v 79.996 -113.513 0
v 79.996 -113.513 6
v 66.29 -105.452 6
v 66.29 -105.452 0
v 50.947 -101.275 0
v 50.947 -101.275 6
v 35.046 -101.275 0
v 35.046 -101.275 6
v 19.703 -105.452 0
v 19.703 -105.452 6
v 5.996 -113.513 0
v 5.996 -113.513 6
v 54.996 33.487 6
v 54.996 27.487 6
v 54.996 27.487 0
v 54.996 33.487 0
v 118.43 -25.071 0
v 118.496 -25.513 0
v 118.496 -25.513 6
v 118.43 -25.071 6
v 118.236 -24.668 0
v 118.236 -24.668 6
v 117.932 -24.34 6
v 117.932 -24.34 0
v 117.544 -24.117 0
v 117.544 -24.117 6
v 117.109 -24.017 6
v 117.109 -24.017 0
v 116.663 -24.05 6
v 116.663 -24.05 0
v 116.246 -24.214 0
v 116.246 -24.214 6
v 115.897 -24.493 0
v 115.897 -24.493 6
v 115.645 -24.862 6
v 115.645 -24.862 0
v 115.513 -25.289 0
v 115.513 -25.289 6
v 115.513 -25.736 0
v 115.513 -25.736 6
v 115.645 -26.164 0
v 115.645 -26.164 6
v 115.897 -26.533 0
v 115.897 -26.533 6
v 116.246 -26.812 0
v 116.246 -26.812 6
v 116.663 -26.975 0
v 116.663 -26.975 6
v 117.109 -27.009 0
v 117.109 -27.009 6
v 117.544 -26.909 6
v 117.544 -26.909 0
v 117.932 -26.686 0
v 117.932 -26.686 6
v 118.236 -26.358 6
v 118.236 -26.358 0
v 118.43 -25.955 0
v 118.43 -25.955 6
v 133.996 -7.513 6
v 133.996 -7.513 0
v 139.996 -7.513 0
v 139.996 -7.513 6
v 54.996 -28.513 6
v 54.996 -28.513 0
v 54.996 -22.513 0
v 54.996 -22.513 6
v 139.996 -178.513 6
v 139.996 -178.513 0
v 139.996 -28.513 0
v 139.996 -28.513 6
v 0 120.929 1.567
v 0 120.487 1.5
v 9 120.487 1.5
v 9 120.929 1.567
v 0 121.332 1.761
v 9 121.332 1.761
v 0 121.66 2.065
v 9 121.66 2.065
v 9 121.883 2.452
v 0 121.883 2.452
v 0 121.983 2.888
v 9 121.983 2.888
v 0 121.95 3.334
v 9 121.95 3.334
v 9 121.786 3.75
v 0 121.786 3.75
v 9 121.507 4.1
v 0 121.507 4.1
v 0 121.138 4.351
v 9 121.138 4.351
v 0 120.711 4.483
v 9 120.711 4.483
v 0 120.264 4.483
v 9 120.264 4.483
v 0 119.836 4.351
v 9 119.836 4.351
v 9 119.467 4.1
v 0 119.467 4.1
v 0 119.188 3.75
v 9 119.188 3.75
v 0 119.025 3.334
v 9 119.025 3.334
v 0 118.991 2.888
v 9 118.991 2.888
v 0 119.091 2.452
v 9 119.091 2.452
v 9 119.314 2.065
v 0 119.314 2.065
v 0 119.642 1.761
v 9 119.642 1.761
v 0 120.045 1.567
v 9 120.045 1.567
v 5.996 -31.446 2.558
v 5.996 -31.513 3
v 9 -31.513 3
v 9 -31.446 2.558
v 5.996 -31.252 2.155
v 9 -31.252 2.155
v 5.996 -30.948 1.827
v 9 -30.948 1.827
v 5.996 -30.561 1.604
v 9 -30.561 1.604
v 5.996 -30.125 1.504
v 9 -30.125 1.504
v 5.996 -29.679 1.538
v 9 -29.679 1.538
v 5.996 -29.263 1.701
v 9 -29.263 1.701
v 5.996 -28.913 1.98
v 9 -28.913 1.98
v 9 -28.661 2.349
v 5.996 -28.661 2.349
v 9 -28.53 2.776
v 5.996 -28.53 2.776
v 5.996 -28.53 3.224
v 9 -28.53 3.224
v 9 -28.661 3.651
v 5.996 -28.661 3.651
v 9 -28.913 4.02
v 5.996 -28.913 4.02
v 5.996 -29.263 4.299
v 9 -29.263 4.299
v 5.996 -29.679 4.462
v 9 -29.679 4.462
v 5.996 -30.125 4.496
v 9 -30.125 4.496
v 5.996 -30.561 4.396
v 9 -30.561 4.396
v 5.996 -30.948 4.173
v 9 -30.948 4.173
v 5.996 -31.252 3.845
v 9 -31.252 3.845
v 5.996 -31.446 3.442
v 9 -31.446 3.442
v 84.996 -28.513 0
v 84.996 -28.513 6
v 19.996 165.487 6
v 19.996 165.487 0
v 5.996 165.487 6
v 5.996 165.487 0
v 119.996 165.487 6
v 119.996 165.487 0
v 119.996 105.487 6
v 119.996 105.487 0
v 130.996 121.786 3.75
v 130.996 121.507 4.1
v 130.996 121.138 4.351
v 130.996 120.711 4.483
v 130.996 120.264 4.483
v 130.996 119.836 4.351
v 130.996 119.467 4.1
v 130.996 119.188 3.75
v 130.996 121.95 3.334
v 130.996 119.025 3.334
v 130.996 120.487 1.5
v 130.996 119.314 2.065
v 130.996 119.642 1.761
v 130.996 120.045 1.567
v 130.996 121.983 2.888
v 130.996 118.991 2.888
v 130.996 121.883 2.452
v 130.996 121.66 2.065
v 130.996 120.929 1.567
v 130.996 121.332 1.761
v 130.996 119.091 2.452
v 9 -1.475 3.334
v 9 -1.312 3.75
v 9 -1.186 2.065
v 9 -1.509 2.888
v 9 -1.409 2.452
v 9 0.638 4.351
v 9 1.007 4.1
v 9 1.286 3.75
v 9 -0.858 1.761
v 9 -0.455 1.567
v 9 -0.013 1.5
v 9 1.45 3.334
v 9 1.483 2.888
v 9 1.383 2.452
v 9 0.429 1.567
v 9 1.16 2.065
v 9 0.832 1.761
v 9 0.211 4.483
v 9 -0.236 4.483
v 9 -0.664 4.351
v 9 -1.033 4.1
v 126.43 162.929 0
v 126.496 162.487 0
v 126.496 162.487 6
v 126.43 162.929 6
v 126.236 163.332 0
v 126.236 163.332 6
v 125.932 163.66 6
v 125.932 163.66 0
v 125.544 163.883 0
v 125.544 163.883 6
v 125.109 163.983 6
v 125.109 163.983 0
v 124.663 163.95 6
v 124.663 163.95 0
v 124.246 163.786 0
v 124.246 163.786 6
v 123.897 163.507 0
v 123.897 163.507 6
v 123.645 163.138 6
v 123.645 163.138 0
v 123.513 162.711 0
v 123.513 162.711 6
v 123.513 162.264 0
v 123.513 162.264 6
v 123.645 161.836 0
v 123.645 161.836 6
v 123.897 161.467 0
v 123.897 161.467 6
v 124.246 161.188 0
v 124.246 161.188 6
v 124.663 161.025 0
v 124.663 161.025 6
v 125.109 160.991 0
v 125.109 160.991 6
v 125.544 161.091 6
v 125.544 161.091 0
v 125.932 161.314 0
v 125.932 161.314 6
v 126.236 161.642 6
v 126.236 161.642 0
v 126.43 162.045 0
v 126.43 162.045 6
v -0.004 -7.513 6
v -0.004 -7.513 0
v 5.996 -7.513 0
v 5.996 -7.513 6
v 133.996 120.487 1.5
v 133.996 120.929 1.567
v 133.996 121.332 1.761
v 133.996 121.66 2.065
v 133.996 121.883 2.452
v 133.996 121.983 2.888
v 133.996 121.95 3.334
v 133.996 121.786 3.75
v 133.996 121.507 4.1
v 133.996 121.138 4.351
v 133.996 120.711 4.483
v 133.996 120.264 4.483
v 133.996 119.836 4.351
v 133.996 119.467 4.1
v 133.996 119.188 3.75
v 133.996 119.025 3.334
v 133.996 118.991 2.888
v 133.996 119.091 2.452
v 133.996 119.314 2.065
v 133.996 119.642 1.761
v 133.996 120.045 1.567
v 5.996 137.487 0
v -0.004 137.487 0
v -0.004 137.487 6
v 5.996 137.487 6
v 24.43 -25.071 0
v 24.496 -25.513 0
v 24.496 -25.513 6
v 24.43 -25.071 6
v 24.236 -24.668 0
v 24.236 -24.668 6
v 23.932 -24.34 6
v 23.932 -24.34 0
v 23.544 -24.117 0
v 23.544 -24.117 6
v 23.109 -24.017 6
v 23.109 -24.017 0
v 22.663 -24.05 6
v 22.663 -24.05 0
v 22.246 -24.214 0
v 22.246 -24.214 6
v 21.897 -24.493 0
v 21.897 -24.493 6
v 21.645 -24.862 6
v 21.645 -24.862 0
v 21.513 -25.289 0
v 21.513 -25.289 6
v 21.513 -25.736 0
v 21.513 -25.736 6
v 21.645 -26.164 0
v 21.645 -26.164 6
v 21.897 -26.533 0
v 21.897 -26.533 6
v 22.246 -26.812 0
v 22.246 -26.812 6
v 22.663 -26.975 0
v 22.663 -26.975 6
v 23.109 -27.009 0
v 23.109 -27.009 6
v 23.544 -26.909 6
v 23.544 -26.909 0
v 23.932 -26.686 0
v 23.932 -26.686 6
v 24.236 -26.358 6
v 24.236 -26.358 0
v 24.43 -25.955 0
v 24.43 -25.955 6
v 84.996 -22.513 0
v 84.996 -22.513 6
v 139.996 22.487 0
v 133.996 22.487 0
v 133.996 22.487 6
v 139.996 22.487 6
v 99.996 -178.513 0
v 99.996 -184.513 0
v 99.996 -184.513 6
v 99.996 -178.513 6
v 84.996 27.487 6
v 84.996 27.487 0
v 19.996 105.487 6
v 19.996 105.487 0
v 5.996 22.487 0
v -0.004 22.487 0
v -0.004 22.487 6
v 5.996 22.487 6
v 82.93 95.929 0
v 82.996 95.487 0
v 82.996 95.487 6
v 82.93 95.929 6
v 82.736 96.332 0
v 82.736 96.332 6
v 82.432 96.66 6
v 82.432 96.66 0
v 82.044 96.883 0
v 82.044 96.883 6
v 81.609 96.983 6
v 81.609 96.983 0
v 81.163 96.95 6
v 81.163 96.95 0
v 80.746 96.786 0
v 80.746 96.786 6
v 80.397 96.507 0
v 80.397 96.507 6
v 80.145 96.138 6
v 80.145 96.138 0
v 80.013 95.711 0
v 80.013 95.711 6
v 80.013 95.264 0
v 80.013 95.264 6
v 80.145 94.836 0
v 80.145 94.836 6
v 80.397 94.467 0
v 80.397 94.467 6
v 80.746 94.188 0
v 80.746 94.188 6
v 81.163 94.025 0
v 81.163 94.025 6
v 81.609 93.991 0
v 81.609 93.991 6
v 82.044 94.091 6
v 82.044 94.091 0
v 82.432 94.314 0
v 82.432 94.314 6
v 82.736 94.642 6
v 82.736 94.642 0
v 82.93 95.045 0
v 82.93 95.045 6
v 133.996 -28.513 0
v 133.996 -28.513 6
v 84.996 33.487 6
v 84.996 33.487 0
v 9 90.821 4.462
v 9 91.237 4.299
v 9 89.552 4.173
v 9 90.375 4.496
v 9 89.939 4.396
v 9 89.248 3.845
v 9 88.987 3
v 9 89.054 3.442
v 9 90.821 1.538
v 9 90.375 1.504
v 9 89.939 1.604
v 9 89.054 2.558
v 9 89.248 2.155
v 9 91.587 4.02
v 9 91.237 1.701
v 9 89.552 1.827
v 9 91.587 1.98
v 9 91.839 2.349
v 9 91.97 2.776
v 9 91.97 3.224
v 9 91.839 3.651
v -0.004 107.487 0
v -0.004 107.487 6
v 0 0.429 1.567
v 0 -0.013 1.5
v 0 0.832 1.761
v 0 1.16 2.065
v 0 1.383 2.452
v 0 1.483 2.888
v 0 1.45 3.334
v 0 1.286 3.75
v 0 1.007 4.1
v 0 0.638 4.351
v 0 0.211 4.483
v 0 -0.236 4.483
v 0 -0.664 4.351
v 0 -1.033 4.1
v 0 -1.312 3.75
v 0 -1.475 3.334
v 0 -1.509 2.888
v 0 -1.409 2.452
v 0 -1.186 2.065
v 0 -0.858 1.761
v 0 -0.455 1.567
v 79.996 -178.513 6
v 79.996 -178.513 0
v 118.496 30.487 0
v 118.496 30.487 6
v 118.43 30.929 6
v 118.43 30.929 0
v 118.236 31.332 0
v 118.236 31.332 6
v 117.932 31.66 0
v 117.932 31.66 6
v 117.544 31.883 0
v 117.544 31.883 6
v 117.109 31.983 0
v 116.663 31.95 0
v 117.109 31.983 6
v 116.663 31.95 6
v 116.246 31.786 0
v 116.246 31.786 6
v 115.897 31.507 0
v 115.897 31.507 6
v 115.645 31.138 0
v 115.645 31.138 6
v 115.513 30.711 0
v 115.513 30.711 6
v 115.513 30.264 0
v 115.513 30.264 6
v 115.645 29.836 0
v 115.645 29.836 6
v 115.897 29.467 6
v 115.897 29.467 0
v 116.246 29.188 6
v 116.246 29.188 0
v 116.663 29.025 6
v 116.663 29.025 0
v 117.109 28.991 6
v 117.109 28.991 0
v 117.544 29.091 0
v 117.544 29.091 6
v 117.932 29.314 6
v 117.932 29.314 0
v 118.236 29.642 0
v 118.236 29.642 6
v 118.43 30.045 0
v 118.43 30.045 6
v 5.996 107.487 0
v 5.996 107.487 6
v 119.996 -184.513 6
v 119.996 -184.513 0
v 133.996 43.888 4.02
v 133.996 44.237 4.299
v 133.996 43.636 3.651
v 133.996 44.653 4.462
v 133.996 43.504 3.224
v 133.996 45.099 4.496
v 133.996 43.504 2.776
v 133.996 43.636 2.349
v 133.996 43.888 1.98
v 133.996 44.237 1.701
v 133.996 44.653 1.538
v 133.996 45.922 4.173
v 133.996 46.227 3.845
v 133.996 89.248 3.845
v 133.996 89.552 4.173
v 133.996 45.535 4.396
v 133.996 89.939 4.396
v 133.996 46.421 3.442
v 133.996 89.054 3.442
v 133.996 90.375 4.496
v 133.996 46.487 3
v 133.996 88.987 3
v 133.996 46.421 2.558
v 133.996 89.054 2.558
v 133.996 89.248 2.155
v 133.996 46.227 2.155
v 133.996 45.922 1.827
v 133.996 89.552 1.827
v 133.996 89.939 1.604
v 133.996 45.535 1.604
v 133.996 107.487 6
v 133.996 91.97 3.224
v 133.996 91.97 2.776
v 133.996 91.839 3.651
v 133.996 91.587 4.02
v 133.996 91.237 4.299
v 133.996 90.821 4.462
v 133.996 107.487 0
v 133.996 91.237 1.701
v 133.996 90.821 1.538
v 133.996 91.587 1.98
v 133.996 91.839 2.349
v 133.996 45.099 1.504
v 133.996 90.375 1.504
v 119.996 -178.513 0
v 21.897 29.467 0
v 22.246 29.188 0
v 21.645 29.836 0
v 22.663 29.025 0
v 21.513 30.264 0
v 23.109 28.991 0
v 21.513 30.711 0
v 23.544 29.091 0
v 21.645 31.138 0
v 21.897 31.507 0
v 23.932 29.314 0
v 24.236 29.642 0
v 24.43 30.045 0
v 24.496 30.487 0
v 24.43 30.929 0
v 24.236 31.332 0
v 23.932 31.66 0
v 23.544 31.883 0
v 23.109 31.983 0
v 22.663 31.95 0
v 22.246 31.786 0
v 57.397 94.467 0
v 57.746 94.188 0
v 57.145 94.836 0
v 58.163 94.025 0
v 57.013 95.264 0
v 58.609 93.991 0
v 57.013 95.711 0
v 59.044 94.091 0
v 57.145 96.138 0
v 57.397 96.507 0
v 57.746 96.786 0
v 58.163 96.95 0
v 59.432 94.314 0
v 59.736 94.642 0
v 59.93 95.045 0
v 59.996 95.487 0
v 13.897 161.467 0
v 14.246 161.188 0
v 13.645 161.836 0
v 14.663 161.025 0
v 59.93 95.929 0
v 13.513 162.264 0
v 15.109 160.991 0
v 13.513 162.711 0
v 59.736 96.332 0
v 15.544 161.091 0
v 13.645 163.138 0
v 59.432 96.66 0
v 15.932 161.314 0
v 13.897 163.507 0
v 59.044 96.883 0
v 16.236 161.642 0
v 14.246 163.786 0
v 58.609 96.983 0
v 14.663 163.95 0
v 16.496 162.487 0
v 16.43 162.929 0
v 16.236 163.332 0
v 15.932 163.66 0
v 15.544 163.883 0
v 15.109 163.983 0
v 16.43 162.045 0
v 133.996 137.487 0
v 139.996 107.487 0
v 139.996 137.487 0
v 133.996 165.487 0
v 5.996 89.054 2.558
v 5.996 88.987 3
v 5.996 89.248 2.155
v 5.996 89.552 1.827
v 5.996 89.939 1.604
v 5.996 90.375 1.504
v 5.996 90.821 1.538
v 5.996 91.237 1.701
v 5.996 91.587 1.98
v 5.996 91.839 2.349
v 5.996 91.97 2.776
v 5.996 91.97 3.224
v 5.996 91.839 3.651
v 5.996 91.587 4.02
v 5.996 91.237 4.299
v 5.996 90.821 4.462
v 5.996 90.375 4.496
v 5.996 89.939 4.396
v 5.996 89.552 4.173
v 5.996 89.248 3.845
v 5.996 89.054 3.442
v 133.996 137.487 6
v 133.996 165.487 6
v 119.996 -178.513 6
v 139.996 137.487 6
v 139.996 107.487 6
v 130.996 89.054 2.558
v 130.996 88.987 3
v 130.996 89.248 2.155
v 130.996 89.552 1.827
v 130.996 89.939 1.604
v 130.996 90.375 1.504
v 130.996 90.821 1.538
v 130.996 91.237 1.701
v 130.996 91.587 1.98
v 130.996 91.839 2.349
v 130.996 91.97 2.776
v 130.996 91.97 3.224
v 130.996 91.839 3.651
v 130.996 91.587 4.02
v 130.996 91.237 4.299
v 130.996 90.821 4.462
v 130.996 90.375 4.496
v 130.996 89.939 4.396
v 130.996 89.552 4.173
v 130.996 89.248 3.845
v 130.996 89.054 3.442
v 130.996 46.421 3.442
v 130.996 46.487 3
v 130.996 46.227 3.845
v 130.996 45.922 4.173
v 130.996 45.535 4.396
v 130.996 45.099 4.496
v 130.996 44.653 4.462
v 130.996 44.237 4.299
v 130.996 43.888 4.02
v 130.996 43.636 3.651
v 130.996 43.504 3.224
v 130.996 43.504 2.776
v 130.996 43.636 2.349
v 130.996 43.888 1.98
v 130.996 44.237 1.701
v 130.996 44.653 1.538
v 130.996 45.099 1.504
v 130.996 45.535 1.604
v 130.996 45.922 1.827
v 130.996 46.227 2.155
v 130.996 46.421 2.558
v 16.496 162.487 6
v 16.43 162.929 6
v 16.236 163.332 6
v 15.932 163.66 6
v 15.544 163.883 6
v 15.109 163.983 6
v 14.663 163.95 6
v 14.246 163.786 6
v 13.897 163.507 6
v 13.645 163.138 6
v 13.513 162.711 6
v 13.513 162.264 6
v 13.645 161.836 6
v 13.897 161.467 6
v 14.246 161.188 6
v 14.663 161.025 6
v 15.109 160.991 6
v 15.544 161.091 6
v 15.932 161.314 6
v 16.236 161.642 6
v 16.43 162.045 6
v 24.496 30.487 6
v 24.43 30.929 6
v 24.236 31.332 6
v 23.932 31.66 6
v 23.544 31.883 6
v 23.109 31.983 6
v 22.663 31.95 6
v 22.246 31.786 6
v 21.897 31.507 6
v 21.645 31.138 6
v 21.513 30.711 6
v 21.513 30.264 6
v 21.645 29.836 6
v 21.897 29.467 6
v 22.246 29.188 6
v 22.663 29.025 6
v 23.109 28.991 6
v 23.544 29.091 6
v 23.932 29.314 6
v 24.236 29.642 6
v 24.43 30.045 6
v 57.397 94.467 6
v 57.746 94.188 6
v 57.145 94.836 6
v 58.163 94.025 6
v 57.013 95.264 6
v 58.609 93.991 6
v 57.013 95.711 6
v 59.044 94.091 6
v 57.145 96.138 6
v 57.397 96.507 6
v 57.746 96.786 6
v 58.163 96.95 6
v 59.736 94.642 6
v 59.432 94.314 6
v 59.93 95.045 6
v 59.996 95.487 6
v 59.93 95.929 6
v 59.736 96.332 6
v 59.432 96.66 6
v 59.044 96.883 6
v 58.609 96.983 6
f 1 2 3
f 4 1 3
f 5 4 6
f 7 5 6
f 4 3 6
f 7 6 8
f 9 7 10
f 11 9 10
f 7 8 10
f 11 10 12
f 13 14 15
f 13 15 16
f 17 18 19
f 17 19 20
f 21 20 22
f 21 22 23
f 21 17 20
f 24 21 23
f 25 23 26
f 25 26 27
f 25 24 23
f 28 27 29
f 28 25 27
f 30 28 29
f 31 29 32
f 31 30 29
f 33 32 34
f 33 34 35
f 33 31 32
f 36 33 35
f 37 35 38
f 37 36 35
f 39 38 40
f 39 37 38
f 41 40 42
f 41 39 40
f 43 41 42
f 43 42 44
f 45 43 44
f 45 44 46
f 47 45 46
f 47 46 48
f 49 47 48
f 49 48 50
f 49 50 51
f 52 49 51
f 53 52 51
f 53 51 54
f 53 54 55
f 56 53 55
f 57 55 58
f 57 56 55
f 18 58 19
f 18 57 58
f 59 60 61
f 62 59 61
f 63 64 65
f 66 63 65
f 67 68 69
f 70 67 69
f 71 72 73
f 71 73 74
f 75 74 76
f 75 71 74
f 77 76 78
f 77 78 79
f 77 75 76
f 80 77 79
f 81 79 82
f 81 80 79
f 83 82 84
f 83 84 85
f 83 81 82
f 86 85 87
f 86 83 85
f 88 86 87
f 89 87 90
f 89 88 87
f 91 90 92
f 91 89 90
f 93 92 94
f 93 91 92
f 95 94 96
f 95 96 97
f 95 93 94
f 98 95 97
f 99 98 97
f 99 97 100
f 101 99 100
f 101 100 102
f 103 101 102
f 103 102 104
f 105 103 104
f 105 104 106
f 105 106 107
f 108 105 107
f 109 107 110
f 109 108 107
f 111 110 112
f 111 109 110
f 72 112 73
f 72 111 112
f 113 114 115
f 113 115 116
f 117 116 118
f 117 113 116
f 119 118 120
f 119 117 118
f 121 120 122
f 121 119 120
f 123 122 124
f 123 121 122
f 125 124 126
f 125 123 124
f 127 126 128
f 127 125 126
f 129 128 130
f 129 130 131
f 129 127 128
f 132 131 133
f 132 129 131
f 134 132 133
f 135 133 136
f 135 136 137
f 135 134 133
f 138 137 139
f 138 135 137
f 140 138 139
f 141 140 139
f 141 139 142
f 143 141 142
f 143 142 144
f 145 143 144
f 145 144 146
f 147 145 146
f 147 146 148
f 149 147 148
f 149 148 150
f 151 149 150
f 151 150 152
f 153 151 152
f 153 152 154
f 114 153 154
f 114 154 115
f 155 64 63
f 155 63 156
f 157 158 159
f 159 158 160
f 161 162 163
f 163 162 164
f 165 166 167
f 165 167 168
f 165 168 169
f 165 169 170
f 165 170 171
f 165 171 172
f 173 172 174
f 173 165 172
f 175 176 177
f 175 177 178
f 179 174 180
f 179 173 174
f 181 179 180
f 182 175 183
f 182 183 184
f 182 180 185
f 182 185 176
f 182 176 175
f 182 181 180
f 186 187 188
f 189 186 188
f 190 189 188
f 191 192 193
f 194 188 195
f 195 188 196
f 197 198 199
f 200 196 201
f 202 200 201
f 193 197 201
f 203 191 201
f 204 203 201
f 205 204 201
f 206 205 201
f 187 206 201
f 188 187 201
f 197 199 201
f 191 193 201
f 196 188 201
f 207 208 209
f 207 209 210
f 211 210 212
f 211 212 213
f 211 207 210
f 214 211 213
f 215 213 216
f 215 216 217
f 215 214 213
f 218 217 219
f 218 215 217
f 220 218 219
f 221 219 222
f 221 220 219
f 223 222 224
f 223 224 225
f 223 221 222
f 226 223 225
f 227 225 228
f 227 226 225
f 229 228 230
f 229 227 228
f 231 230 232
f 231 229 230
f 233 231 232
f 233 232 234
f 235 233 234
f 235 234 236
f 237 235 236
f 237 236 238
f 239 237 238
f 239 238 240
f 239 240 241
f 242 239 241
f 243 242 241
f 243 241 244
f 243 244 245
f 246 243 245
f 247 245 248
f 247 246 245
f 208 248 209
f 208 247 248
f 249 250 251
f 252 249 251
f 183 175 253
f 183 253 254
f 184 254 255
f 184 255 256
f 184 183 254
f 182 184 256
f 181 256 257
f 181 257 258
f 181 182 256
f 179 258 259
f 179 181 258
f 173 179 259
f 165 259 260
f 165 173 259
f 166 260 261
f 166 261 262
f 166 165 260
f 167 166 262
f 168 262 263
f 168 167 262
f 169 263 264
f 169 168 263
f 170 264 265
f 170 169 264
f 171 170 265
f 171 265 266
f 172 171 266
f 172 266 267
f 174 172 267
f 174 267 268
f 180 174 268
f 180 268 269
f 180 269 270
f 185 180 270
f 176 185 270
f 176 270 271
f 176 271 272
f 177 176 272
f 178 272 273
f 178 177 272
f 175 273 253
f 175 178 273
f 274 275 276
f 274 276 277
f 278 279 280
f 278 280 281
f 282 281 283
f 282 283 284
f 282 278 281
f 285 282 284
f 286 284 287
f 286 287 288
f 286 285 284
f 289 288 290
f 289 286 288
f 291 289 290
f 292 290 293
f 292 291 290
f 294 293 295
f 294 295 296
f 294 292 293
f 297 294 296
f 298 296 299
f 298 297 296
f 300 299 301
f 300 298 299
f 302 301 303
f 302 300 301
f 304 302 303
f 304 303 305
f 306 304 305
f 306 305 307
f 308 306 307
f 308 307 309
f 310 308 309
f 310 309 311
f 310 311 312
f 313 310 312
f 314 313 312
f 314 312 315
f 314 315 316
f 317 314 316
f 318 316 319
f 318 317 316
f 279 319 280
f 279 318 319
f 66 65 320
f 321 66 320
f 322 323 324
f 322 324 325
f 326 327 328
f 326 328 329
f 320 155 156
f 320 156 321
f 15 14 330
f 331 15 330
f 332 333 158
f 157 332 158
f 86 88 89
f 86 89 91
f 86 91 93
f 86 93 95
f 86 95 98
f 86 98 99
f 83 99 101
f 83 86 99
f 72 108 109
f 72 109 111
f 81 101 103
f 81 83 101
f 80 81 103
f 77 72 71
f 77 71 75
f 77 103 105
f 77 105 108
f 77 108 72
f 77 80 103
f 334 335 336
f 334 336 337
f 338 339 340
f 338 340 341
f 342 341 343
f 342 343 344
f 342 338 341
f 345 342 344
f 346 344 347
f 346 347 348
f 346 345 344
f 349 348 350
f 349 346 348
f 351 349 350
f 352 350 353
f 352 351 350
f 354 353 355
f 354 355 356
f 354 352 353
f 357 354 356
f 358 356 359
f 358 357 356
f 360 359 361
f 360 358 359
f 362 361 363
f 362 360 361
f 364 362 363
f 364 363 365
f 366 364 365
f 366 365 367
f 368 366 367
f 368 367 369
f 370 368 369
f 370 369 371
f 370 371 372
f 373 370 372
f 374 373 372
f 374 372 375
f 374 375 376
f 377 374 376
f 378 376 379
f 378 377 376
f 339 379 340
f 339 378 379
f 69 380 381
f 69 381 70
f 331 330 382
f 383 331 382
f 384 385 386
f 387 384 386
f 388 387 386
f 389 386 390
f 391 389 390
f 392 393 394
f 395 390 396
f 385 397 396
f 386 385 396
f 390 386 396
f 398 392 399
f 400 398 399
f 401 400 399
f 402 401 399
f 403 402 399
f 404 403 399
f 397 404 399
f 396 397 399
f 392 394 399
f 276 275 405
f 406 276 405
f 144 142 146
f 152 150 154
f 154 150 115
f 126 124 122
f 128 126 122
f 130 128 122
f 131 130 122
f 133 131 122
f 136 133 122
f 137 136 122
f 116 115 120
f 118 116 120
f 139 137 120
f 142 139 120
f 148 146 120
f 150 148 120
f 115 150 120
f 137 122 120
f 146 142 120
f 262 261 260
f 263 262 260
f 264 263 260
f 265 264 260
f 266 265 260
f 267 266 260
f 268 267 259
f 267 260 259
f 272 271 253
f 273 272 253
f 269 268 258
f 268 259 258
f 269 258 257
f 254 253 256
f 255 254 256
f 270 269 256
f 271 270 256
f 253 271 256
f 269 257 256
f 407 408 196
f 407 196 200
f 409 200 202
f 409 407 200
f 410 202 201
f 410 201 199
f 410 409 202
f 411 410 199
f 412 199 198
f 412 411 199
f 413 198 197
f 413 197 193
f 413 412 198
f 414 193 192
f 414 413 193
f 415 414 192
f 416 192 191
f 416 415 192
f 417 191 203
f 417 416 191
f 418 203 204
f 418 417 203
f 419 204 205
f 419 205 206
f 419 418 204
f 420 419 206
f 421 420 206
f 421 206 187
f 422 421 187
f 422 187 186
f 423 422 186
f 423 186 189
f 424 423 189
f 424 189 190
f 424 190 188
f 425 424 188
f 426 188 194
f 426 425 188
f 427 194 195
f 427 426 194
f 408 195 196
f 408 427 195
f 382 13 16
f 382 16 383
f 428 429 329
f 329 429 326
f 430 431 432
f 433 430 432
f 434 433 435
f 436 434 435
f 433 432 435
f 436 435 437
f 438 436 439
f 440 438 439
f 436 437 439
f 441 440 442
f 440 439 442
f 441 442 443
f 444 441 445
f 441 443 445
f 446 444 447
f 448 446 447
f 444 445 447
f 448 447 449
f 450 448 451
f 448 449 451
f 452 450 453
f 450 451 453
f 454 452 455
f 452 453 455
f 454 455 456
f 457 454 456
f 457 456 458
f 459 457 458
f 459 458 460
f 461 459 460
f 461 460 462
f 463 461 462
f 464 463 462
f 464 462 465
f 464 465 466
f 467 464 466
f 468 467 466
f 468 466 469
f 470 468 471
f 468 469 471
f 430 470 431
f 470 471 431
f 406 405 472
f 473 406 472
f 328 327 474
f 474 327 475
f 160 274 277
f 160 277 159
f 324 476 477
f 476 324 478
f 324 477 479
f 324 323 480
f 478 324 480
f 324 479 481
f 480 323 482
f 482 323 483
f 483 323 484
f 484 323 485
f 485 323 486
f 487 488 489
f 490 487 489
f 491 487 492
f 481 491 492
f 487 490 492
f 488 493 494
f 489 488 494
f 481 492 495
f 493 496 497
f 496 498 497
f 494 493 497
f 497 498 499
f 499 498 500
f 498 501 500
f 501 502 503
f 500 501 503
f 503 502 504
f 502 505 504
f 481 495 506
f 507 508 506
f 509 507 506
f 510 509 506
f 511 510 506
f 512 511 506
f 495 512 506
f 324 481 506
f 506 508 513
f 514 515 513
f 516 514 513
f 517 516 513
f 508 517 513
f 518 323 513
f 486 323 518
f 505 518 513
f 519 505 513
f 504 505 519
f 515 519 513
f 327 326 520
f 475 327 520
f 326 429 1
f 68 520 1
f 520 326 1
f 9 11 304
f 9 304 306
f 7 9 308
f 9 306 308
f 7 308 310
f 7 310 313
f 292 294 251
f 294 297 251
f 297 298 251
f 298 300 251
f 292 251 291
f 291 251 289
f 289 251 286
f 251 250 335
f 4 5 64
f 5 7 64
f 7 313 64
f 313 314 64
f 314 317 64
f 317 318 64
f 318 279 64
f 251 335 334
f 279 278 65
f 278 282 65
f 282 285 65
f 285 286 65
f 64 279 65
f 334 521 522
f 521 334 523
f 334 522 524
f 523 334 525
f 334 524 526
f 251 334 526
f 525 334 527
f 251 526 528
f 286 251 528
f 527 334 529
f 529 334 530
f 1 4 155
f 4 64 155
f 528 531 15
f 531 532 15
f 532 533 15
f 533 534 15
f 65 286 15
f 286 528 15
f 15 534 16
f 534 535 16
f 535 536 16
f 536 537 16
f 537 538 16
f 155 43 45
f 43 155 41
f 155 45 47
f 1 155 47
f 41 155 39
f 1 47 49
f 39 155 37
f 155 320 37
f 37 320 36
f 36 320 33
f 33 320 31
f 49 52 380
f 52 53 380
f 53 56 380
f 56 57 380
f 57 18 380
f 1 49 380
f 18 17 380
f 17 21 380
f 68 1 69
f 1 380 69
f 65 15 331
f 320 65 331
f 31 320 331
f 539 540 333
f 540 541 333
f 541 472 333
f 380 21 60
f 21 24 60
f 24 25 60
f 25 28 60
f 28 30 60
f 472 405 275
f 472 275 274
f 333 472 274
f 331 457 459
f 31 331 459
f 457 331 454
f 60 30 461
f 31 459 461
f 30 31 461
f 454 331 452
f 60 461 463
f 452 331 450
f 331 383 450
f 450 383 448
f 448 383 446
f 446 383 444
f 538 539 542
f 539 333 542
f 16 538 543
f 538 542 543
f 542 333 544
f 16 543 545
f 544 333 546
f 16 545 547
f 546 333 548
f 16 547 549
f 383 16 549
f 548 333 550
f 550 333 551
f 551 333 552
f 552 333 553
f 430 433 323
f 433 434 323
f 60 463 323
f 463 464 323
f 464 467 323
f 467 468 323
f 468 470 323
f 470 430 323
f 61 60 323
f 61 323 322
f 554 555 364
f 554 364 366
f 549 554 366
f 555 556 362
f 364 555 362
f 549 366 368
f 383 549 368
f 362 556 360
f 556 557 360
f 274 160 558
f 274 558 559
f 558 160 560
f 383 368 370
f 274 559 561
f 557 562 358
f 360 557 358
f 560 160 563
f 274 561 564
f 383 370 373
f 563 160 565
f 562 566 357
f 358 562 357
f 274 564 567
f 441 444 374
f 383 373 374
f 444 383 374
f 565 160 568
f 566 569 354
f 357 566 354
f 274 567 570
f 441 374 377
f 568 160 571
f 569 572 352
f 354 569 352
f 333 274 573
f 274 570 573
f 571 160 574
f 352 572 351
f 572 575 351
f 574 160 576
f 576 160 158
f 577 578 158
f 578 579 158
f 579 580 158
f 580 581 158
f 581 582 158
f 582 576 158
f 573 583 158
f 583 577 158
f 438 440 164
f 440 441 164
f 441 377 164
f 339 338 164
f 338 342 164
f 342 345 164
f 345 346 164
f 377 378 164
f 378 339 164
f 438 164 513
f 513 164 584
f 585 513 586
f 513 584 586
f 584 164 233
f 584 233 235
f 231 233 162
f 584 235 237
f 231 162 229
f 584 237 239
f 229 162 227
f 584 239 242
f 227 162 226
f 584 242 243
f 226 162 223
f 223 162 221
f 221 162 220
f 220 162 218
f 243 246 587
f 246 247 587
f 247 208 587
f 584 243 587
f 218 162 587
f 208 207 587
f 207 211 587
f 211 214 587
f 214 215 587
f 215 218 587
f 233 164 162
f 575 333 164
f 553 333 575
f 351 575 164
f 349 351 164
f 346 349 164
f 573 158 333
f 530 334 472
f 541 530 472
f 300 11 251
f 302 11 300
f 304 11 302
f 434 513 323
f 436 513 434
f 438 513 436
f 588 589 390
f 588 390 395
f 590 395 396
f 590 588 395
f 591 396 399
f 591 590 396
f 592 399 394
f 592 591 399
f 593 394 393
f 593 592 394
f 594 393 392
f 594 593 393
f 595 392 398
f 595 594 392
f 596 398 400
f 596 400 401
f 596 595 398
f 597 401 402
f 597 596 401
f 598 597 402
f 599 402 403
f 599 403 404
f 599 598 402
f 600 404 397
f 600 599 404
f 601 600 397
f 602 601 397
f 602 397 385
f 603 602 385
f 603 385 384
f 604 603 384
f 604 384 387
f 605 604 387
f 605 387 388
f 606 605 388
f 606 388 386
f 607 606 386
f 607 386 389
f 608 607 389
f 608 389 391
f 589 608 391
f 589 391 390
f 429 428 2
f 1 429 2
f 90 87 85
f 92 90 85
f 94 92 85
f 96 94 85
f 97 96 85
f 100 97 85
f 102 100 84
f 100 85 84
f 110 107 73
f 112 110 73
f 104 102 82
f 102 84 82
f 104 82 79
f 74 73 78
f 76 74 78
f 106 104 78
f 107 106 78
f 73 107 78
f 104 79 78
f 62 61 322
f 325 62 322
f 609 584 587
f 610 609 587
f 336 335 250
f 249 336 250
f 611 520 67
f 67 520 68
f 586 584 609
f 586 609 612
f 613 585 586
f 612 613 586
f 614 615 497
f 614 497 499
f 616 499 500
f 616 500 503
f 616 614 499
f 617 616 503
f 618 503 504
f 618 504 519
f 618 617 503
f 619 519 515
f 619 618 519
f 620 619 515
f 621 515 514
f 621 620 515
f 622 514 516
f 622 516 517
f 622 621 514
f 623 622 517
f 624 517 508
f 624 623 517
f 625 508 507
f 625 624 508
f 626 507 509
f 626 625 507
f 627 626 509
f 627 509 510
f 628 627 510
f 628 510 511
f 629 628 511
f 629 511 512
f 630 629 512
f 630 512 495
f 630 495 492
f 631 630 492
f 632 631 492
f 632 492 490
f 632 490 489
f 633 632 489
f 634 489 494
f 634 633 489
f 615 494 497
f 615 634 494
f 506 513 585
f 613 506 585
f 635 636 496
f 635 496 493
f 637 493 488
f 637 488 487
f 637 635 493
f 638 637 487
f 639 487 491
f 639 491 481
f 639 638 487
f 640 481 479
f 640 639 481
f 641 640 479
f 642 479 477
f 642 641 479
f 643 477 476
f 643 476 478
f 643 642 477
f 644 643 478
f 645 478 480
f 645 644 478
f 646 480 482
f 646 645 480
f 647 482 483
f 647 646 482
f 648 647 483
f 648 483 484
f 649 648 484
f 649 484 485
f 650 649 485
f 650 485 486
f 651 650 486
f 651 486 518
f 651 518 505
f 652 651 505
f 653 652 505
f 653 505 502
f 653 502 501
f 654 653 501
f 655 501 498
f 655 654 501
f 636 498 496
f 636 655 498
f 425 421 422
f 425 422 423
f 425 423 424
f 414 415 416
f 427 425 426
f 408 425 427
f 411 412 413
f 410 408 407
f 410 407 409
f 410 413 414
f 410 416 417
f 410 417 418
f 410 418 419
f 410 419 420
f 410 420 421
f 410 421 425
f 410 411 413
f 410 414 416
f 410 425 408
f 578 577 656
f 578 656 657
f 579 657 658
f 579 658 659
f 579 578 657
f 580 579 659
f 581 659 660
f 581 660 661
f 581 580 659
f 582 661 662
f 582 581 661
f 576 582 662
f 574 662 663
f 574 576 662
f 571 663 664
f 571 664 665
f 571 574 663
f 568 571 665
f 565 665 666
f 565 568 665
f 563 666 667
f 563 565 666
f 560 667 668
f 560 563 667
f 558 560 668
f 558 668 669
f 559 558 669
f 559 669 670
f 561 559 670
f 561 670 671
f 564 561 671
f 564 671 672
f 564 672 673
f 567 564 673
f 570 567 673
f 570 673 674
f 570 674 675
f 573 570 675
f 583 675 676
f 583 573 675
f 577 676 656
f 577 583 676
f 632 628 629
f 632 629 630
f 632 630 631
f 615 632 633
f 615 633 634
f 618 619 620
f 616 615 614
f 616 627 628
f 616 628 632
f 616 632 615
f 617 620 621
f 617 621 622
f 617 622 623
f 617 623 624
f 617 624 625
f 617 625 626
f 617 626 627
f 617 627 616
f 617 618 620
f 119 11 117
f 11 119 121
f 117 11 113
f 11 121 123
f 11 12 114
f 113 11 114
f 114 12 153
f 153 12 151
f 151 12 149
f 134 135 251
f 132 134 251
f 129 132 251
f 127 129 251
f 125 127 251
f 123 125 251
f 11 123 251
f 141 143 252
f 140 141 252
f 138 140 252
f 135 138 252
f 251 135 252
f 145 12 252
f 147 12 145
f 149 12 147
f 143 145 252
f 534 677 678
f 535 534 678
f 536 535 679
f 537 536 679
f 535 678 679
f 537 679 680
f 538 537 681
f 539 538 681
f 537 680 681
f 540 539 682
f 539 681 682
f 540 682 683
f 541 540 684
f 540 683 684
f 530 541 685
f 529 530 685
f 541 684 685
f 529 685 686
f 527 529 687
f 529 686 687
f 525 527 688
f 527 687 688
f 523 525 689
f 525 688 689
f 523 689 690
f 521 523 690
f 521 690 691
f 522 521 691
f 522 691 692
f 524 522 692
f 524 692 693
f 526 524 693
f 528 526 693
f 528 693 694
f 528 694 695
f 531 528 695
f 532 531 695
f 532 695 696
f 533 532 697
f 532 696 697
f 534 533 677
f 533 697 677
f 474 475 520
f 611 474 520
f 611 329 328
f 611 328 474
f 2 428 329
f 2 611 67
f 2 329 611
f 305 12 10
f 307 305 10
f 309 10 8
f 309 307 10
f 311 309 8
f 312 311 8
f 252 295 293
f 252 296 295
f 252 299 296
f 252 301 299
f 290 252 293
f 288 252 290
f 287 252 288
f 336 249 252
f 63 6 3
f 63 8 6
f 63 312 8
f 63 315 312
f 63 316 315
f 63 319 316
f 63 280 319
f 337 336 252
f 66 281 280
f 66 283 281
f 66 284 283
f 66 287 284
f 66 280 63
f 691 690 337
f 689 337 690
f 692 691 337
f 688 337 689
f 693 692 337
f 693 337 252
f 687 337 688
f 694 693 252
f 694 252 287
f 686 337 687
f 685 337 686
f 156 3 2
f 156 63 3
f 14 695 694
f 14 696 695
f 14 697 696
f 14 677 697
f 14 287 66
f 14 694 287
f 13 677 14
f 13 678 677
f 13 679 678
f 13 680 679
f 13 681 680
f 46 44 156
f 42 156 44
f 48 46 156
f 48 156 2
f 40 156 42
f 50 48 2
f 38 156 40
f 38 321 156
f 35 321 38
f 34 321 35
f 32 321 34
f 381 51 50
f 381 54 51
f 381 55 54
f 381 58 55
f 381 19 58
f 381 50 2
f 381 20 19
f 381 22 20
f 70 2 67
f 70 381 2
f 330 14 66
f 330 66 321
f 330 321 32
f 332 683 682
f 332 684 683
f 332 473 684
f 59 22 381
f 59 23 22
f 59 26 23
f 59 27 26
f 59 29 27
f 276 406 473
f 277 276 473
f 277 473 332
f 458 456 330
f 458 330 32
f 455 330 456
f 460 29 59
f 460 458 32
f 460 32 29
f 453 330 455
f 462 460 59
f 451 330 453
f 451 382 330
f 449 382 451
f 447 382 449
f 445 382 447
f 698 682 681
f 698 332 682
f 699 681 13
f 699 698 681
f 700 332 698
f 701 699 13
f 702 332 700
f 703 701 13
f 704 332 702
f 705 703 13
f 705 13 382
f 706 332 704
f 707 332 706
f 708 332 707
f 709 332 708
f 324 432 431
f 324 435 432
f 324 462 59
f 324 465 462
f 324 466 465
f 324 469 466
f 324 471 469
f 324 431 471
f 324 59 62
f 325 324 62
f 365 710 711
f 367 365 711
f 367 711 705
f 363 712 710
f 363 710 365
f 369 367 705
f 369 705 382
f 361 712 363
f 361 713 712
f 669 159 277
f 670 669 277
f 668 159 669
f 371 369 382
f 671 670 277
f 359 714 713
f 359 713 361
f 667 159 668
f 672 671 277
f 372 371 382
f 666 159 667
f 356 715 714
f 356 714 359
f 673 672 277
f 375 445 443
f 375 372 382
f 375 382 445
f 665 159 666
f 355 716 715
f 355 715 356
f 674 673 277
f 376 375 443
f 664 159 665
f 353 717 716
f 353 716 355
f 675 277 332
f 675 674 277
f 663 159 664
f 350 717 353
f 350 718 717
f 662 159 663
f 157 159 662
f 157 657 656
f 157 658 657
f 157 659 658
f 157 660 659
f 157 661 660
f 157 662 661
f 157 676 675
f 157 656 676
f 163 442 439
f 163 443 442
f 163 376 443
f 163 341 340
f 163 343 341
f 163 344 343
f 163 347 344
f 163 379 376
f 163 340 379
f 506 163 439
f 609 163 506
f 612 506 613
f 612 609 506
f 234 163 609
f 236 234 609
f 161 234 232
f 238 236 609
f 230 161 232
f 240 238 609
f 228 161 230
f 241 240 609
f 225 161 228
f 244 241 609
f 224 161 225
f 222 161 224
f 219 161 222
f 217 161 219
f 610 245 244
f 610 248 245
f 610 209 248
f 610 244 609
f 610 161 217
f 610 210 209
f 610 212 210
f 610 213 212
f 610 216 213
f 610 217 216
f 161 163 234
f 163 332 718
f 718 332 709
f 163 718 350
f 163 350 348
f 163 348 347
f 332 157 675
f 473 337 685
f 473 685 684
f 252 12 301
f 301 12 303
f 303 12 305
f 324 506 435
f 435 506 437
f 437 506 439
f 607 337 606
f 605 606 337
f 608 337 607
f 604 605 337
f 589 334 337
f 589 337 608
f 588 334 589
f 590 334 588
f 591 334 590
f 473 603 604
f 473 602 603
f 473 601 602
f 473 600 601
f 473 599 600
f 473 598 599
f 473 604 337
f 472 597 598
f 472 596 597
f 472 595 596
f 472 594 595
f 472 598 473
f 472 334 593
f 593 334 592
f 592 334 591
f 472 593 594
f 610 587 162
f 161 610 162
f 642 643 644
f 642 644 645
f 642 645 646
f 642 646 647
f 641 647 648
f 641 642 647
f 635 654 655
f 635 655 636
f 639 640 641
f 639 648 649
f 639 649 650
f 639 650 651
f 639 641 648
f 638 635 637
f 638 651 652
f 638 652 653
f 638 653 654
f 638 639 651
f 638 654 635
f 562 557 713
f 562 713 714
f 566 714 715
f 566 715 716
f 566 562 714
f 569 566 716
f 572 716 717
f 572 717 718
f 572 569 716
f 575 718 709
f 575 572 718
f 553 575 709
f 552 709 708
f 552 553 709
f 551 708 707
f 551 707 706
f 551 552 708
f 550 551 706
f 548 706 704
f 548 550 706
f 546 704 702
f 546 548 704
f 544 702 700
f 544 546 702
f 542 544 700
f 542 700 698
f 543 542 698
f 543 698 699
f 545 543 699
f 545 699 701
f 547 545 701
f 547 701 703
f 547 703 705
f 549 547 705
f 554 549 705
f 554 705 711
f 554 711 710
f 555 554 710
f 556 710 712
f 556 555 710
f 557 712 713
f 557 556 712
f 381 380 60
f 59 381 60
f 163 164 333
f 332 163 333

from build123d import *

# Parameters (mm, degrees)
ESQUISSE1_R             = 1.5
ESQUISSE1_W             = 30
ESQUISSE1_H             = 6
BOSS_EXTRU_3_DEPTH      = 6
ESQUISSE4_W             = 6
ESQUISSE4_H             = 28
ESQUISSE4_H_2           = 85
ESQUISSE4_H_3           = 51
ESQUISSE4_H_4           = 21
ENL_V_MAT_EXTRU_2_DEPTH = 6
ESQUISSE5_R             = 1.5
ENL_V_MAT_EXTRU_3_DEPTH = 9
ENL_V_START             = -3
ESQUISSE6_R             = 1.5
ENL_V_MAT_EXTRU_6_DEPTH = 3
ESQUISSE7_W             = 20
ESQUISSE7_H             = 6
ENL_V_MAT_EXTRU_7_DEPTH = 10
ENL_V_MAT_EXTRU_8_DEPTH = 6
ESQUISSE9_R             = 1.5
ESQUISSE9_W             = 30
ESQUISSE9_H             = 6
ENL_V_MAT_EXTRU_9_DEPTH = 6


with BuildPart() as part:
    # Esquisse1 → Boss.-Extru.3 (new body)
    with BuildSketch(Plane.XY):
        Polygon((19.996437878, 165.487179487), (-0.003562122, 165.487179487), (-0.003562122, -184.512820513), (139.996437878, -184.512820513), (139.996437878, 165.487179487), (119.996437878, 165.487179487), (119.996437878, 105.487179487), (19.996437878, 105.487179487), align=None)
        with Locations((22.996437878, -25.512820513)):
            Circle(ESQUISSE1_R, mode=Mode.SUBTRACT)
        with Locations((69.996437878, -25.512820513)):
            Rectangle(ESQUISSE1_W, ESQUISSE1_H, mode=Mode.SUBTRACT)
        with Locations((116.996437878, -25.512820513)):
            Circle(ESQUISSE1_R, mode=Mode.SUBTRACT)
        with Locations((14.996437878, 162.487179487)):
            Circle(ESQUISSE1_R, mode=Mode.SUBTRACT)
        with Locations((58.496437878, 95.487179487)):
            Circle(ESQUISSE1_R, mode=Mode.SUBTRACT)
        with Locations((81.496437878, 95.487179487)):
            Circle(ESQUISSE1_R, mode=Mode.SUBTRACT)
        with Locations((124.996437878, 162.487179487)):
            Circle(ESQUISSE1_R, mode=Mode.SUBTRACT)
    extrude(amount=BOSS_EXTRU_3_DEPTH)

    # Esquisse4 → Enlèv. mat.-Extru.2 (cut)
    with BuildSketch(Plane.XY):
        with Locations((2.996437878, 151.487179487)):
            Rectangle(ESQUISSE4_W, ESQUISSE4_H)
        with Locations((2.996437878, 64.987179487)):
            Rectangle(ESQUISSE4_W, ESQUISSE4_H_2)
        with Locations((2.996437878, -33.012820513)):
            Rectangle(ESQUISSE4_W, ESQUISSE4_H_3)
        with Locations((136.996437878, -18.012820513)):
            Rectangle(ESQUISSE4_W, ESQUISSE4_H_4)
        with Locations((136.996437878, 64.987179487)):
            Rectangle(ESQUISSE4_W, ESQUISSE4_H_2)
        with Locations((136.996437878, 151.487179487)):
            Rectangle(ESQUISSE4_W, ESQUISSE4_H)
    extrude(amount=ENL_V_MAT_EXTRU_2_DEPTH, mode=Mode.SUBTRACT)

    # Esquisse5 → Enlèv. mat.-Extru.3 (cut)
    with BuildSketch(Plane(origin=(0, 0, 0), x_dir=(0, 0, -1), z_dir=(1, 0, 0))):
        with Locations(Location((-3, -30.012820513, 0), (0, 0, 270))):
            Circle(ESQUISSE5_R)
        with Locations((-3, -0.012820513)):
            Circle(ESQUISSE5_R)
        with Locations(Location((-3, 90.487179487, 0), (0, 0, 270))):
            Circle(ESQUISSE5_R)
        with Locations((-3, 120.487179487)):
            Circle(ESQUISSE5_R)
    extrude(amount=ENL_V_MAT_EXTRU_3_DEPTH, mode=Mode.SUBTRACT)

    # Esquisse6 → Enlèv. mat.-Extru.6 (cut)
    with BuildSketch(Plane(origin=(133.996437878, 0, 0), x_dir=(0, 0, -1), z_dir=(1, 0, 0)).offset(ENL_V_START)):
        with Locations(Location((-3, 90.487179487, 0), (0, 0, 270))):
            Circle(ESQUISSE6_R)
        with Locations(Location((-3, 44.987179487, 0), (0, 0, 90))):
            Circle(ESQUISSE6_R)
        with Locations((-3, 120.487179487)):
            Circle(ESQUISSE6_R)
    extrude(amount=ENL_V_MAT_EXTRU_6_DEPTH, mode=Mode.SUBTRACT)

    # Esquisse7 → Enlèv. mat.-Extru.7 (cut)
    with BuildSketch(Plane.XY):
        with Locations((129.996437878, -181.512820513)):
            Rectangle(ESQUISSE7_W, ESQUISSE7_H)
        with Locations((89.996437878, -181.512820513)):
            Rectangle(ESQUISSE7_W, ESQUISSE7_H)
    extrude(amount=ENL_V_MAT_EXTRU_7_DEPTH, mode=Mode.SUBTRACT)

    # Esquisse8 → Enlèv. mat.-Extru.8 (cut)
    with BuildSketch(Plane.XY.offset(6)):
        with BuildLine():
            Line((79.996437878, -178.512820513), (79.996437878, -113.512820513))
            ThreePointArc((79.996437878, -113.512820513), (42.996437878, -100.746283227), (5.996437878, -113.512820513))
            Line((5.996437878, -113.512820513), (5.996437878, -58.512820513))
            Line((5.996437878, -58.512820513), (-0.003562122, -58.512820513))
            Line((-0.003562122, -58.512820513), (-0.003562122, -184.512820513))
            Line((-0.003562122, -184.512820513), (79.996437878, -184.512820513))
            Line((79.996437878, -184.512820513), (79.996437878, -178.512820513))
        make_face()
    extrude(amount=-ENL_V_MAT_EXTRU_8_DEPTH, mode=Mode.SUBTRACT)

    # Esquisse9 → Enlèv. mat.-Extru.9 (cut)
    with BuildSketch(Plane.XY.offset(6)):
        with Locations((116.996437878, 30.487179487)):
            Circle(ESQUISSE9_R)
        with Locations((22.996437878, 30.487179487)):
            Circle(ESQUISSE9_R)
        with Locations((69.996437878, 30.487179487)):
            Rectangle(ESQUISSE9_W, ESQUISSE9_H)
    extrude(amount=-ENL_V_MAT_EXTRU_9_DEPTH, mode=Mode.SUBTRACT)


solid = part.part
